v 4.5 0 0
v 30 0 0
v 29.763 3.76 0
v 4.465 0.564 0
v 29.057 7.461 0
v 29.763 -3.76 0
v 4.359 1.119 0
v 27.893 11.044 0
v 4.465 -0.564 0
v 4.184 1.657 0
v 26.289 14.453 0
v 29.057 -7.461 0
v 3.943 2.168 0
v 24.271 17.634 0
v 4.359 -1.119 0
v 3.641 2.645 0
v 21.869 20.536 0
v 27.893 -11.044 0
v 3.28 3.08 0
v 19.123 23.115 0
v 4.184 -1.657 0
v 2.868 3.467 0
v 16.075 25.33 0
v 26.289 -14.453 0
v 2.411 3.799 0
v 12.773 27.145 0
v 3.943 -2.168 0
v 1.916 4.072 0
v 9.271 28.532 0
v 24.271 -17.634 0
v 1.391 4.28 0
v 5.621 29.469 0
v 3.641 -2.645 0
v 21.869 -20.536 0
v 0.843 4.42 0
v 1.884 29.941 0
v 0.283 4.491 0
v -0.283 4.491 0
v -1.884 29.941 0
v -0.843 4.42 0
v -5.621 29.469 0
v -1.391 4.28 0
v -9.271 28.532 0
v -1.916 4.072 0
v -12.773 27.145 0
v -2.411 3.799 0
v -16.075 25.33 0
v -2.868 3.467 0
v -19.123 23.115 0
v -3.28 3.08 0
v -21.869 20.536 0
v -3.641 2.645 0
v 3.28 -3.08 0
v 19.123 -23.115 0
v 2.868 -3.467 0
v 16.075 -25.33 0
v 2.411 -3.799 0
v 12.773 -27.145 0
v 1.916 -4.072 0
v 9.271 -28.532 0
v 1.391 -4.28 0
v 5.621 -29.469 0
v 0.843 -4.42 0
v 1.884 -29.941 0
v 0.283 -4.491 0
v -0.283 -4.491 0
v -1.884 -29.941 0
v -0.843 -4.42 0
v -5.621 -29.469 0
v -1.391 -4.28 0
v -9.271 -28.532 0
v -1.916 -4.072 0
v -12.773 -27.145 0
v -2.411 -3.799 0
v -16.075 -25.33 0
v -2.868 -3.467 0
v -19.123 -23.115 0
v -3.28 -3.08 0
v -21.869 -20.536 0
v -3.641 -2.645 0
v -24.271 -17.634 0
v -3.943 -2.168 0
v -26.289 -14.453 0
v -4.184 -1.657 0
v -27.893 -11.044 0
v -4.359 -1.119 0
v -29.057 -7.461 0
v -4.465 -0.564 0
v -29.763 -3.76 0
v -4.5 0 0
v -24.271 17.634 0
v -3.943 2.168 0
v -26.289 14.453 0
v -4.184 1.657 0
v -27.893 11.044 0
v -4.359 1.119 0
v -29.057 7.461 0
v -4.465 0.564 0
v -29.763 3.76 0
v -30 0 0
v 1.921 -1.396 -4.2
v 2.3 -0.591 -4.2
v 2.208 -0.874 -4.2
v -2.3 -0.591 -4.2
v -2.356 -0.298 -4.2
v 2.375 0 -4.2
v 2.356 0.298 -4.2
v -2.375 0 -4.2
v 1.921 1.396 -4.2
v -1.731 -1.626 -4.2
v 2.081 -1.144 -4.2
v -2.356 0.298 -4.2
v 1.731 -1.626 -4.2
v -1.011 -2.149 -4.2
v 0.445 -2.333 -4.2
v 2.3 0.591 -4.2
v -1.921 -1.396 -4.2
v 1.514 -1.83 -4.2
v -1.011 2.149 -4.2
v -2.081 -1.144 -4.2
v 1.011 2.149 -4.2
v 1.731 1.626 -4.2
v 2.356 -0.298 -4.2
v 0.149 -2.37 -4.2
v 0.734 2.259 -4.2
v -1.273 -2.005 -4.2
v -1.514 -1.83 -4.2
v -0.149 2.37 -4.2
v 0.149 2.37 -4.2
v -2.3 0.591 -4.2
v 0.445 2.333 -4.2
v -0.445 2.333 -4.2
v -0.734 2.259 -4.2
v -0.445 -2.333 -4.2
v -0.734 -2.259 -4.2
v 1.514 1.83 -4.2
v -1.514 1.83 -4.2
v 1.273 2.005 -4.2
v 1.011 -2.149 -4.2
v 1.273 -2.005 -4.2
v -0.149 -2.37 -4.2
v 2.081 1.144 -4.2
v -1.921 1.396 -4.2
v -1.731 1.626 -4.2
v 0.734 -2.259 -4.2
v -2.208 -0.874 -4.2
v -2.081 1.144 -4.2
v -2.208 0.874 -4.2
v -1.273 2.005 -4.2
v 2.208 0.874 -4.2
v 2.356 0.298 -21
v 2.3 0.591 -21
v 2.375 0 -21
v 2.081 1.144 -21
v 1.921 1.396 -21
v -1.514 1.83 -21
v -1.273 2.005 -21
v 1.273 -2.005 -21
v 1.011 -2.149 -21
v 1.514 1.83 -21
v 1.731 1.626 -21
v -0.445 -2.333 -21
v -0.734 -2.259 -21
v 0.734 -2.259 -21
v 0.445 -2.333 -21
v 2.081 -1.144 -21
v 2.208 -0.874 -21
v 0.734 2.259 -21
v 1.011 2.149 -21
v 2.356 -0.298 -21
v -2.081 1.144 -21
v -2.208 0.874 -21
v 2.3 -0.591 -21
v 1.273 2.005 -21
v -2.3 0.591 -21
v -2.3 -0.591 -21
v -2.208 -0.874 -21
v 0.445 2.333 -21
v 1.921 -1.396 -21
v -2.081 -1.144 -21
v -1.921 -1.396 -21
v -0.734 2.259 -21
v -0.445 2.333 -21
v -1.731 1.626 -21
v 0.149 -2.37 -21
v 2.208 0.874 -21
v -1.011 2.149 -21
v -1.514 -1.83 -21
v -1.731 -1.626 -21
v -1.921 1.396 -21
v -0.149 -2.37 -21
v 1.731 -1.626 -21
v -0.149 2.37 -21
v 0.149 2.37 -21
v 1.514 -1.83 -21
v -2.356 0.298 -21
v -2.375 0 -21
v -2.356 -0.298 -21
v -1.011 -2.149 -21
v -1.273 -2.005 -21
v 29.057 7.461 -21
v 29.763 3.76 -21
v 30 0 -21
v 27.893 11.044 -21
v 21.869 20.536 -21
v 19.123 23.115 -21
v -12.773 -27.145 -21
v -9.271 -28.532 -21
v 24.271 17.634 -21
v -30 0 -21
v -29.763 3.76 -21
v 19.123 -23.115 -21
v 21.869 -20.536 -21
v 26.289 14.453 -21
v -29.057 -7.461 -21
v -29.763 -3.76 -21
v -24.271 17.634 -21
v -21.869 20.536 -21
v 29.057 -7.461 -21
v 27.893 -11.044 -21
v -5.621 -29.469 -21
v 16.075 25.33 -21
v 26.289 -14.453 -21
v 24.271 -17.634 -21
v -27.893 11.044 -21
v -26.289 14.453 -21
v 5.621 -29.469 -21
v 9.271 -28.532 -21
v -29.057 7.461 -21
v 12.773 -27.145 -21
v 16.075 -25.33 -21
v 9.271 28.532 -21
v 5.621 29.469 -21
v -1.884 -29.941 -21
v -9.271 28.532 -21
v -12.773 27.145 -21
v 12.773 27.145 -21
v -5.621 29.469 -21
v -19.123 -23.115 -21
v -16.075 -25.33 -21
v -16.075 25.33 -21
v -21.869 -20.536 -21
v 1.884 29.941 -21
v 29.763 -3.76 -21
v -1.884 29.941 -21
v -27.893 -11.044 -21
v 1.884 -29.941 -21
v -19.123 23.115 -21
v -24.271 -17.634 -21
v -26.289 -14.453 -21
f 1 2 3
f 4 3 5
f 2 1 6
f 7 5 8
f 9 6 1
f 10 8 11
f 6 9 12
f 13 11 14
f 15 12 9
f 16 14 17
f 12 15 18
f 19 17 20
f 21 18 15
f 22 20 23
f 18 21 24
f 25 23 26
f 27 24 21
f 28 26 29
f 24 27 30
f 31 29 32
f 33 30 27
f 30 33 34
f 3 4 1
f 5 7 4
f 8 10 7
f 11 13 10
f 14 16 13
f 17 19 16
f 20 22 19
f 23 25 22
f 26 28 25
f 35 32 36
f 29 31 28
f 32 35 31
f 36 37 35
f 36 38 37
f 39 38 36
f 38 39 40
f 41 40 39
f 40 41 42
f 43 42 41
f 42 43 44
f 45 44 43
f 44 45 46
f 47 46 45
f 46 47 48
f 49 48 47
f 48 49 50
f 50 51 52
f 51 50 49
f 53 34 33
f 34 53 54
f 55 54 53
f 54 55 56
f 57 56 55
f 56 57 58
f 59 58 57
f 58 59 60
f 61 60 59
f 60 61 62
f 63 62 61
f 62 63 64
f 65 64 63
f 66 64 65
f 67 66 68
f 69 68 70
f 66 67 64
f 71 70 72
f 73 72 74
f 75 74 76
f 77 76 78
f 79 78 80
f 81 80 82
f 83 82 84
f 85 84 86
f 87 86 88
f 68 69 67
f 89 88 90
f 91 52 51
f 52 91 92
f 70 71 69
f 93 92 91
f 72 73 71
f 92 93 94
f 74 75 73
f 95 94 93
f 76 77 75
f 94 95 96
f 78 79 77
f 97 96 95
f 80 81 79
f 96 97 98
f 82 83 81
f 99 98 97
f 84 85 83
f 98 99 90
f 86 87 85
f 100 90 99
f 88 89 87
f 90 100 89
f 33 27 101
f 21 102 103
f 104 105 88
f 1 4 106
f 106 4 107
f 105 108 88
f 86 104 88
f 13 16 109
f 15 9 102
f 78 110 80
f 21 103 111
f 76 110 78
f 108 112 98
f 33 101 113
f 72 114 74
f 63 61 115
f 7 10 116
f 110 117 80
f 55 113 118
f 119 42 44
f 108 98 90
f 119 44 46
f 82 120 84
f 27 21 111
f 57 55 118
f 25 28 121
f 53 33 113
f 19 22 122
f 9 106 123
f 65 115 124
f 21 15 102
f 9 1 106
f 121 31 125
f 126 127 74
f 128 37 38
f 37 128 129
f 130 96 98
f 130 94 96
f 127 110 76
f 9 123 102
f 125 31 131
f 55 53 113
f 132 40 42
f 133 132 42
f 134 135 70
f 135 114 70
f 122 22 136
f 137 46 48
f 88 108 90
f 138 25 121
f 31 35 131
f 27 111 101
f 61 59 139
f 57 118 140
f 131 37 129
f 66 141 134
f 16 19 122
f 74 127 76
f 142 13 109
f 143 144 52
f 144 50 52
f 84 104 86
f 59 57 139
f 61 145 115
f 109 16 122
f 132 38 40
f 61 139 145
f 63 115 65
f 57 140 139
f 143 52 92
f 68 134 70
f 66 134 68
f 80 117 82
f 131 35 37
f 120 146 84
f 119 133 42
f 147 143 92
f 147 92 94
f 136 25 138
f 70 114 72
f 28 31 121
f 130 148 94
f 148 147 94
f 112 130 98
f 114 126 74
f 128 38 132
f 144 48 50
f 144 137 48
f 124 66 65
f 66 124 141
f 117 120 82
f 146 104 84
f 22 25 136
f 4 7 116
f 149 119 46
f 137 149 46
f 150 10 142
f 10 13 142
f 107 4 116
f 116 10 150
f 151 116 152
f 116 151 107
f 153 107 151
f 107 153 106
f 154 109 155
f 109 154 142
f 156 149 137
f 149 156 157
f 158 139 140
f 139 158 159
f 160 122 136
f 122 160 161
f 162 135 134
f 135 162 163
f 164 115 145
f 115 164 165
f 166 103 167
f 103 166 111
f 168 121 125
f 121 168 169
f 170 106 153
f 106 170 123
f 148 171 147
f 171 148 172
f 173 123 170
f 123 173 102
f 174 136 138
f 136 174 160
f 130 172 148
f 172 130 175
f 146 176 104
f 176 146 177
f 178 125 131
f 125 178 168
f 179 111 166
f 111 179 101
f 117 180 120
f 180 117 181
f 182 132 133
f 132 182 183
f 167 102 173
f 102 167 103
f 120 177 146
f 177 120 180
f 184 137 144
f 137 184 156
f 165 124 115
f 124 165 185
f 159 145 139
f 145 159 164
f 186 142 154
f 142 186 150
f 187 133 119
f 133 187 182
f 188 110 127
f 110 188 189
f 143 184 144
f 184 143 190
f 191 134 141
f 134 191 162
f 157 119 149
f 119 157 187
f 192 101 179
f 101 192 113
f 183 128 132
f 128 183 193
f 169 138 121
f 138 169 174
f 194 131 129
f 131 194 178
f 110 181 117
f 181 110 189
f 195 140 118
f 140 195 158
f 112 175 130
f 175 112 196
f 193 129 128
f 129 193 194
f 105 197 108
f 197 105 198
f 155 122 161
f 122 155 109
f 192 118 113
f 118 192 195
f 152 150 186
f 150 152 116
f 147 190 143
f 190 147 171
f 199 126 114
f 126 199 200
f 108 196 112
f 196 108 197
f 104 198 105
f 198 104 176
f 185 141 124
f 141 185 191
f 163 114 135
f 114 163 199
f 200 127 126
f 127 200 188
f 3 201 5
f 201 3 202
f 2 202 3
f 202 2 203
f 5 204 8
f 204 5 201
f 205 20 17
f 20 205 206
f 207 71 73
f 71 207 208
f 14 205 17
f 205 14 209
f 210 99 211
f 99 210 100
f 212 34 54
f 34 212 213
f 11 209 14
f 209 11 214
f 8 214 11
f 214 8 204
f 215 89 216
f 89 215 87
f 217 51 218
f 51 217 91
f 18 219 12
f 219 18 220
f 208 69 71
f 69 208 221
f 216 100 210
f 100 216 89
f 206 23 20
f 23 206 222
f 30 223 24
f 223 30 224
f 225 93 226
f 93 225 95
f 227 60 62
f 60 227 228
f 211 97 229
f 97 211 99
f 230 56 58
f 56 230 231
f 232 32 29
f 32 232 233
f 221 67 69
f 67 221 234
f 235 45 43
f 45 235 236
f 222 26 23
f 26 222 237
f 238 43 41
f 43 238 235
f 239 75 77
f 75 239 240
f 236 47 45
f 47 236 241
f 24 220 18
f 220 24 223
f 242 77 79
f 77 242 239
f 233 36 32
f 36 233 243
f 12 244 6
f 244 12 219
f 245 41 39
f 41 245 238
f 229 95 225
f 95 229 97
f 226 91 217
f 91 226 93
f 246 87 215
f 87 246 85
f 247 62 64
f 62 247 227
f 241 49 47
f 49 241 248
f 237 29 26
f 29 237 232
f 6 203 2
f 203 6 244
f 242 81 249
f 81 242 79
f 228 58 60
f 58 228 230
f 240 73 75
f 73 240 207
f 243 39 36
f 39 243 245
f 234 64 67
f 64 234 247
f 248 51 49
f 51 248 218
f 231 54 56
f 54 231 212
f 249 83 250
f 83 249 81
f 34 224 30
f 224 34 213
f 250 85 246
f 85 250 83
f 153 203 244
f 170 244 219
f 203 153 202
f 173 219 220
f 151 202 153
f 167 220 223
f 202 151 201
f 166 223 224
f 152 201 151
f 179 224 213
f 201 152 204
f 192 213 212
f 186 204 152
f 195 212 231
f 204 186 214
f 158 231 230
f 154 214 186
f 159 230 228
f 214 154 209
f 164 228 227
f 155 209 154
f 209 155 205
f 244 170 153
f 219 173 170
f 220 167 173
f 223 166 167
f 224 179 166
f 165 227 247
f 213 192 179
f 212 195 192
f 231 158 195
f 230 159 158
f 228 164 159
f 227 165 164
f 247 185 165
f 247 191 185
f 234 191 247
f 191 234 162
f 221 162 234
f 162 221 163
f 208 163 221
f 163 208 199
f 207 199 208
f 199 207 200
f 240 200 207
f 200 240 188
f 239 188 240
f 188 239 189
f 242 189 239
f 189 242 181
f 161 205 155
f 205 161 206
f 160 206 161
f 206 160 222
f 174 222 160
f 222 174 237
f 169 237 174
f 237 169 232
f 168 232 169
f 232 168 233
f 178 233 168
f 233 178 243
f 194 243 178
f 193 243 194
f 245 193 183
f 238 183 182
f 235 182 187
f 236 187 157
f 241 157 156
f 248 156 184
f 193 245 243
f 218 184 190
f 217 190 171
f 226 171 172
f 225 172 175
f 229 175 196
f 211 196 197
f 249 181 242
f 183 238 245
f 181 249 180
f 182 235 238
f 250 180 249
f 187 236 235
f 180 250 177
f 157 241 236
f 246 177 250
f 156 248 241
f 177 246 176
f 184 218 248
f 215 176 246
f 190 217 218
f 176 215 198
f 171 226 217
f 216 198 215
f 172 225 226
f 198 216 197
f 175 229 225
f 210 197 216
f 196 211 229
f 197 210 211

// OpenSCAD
$fn = 50;

difference() {
	union() {
		translate(v = [0, 0, -21.0]) {
			cylinder(h = 21, r = 30.0);
		}
	}
	union() {
		translate(v = [0, 0, 0]) {
			rotate(a = [0, 0, 0]) {
				difference() {
					union() {
						translate(v = [0, 0, -24.0]) {
							cylinder(h = 24, r = 2.25);
						}
						translate(v = [0, 0, -4.2]) {
							cylinder(h = 4.2, r1 = 2.375, r2 = 4.5);
						}
						translate(v = [0, 0, -24.0]) {
							cylinder(h = 24, r = 2.375);
						}
						translate(v = [0, 0, -24.0]) {
							cylinder(h = 24, r = 2.25);
						}
					}
					union();
				}
			}
		}
	}
}
